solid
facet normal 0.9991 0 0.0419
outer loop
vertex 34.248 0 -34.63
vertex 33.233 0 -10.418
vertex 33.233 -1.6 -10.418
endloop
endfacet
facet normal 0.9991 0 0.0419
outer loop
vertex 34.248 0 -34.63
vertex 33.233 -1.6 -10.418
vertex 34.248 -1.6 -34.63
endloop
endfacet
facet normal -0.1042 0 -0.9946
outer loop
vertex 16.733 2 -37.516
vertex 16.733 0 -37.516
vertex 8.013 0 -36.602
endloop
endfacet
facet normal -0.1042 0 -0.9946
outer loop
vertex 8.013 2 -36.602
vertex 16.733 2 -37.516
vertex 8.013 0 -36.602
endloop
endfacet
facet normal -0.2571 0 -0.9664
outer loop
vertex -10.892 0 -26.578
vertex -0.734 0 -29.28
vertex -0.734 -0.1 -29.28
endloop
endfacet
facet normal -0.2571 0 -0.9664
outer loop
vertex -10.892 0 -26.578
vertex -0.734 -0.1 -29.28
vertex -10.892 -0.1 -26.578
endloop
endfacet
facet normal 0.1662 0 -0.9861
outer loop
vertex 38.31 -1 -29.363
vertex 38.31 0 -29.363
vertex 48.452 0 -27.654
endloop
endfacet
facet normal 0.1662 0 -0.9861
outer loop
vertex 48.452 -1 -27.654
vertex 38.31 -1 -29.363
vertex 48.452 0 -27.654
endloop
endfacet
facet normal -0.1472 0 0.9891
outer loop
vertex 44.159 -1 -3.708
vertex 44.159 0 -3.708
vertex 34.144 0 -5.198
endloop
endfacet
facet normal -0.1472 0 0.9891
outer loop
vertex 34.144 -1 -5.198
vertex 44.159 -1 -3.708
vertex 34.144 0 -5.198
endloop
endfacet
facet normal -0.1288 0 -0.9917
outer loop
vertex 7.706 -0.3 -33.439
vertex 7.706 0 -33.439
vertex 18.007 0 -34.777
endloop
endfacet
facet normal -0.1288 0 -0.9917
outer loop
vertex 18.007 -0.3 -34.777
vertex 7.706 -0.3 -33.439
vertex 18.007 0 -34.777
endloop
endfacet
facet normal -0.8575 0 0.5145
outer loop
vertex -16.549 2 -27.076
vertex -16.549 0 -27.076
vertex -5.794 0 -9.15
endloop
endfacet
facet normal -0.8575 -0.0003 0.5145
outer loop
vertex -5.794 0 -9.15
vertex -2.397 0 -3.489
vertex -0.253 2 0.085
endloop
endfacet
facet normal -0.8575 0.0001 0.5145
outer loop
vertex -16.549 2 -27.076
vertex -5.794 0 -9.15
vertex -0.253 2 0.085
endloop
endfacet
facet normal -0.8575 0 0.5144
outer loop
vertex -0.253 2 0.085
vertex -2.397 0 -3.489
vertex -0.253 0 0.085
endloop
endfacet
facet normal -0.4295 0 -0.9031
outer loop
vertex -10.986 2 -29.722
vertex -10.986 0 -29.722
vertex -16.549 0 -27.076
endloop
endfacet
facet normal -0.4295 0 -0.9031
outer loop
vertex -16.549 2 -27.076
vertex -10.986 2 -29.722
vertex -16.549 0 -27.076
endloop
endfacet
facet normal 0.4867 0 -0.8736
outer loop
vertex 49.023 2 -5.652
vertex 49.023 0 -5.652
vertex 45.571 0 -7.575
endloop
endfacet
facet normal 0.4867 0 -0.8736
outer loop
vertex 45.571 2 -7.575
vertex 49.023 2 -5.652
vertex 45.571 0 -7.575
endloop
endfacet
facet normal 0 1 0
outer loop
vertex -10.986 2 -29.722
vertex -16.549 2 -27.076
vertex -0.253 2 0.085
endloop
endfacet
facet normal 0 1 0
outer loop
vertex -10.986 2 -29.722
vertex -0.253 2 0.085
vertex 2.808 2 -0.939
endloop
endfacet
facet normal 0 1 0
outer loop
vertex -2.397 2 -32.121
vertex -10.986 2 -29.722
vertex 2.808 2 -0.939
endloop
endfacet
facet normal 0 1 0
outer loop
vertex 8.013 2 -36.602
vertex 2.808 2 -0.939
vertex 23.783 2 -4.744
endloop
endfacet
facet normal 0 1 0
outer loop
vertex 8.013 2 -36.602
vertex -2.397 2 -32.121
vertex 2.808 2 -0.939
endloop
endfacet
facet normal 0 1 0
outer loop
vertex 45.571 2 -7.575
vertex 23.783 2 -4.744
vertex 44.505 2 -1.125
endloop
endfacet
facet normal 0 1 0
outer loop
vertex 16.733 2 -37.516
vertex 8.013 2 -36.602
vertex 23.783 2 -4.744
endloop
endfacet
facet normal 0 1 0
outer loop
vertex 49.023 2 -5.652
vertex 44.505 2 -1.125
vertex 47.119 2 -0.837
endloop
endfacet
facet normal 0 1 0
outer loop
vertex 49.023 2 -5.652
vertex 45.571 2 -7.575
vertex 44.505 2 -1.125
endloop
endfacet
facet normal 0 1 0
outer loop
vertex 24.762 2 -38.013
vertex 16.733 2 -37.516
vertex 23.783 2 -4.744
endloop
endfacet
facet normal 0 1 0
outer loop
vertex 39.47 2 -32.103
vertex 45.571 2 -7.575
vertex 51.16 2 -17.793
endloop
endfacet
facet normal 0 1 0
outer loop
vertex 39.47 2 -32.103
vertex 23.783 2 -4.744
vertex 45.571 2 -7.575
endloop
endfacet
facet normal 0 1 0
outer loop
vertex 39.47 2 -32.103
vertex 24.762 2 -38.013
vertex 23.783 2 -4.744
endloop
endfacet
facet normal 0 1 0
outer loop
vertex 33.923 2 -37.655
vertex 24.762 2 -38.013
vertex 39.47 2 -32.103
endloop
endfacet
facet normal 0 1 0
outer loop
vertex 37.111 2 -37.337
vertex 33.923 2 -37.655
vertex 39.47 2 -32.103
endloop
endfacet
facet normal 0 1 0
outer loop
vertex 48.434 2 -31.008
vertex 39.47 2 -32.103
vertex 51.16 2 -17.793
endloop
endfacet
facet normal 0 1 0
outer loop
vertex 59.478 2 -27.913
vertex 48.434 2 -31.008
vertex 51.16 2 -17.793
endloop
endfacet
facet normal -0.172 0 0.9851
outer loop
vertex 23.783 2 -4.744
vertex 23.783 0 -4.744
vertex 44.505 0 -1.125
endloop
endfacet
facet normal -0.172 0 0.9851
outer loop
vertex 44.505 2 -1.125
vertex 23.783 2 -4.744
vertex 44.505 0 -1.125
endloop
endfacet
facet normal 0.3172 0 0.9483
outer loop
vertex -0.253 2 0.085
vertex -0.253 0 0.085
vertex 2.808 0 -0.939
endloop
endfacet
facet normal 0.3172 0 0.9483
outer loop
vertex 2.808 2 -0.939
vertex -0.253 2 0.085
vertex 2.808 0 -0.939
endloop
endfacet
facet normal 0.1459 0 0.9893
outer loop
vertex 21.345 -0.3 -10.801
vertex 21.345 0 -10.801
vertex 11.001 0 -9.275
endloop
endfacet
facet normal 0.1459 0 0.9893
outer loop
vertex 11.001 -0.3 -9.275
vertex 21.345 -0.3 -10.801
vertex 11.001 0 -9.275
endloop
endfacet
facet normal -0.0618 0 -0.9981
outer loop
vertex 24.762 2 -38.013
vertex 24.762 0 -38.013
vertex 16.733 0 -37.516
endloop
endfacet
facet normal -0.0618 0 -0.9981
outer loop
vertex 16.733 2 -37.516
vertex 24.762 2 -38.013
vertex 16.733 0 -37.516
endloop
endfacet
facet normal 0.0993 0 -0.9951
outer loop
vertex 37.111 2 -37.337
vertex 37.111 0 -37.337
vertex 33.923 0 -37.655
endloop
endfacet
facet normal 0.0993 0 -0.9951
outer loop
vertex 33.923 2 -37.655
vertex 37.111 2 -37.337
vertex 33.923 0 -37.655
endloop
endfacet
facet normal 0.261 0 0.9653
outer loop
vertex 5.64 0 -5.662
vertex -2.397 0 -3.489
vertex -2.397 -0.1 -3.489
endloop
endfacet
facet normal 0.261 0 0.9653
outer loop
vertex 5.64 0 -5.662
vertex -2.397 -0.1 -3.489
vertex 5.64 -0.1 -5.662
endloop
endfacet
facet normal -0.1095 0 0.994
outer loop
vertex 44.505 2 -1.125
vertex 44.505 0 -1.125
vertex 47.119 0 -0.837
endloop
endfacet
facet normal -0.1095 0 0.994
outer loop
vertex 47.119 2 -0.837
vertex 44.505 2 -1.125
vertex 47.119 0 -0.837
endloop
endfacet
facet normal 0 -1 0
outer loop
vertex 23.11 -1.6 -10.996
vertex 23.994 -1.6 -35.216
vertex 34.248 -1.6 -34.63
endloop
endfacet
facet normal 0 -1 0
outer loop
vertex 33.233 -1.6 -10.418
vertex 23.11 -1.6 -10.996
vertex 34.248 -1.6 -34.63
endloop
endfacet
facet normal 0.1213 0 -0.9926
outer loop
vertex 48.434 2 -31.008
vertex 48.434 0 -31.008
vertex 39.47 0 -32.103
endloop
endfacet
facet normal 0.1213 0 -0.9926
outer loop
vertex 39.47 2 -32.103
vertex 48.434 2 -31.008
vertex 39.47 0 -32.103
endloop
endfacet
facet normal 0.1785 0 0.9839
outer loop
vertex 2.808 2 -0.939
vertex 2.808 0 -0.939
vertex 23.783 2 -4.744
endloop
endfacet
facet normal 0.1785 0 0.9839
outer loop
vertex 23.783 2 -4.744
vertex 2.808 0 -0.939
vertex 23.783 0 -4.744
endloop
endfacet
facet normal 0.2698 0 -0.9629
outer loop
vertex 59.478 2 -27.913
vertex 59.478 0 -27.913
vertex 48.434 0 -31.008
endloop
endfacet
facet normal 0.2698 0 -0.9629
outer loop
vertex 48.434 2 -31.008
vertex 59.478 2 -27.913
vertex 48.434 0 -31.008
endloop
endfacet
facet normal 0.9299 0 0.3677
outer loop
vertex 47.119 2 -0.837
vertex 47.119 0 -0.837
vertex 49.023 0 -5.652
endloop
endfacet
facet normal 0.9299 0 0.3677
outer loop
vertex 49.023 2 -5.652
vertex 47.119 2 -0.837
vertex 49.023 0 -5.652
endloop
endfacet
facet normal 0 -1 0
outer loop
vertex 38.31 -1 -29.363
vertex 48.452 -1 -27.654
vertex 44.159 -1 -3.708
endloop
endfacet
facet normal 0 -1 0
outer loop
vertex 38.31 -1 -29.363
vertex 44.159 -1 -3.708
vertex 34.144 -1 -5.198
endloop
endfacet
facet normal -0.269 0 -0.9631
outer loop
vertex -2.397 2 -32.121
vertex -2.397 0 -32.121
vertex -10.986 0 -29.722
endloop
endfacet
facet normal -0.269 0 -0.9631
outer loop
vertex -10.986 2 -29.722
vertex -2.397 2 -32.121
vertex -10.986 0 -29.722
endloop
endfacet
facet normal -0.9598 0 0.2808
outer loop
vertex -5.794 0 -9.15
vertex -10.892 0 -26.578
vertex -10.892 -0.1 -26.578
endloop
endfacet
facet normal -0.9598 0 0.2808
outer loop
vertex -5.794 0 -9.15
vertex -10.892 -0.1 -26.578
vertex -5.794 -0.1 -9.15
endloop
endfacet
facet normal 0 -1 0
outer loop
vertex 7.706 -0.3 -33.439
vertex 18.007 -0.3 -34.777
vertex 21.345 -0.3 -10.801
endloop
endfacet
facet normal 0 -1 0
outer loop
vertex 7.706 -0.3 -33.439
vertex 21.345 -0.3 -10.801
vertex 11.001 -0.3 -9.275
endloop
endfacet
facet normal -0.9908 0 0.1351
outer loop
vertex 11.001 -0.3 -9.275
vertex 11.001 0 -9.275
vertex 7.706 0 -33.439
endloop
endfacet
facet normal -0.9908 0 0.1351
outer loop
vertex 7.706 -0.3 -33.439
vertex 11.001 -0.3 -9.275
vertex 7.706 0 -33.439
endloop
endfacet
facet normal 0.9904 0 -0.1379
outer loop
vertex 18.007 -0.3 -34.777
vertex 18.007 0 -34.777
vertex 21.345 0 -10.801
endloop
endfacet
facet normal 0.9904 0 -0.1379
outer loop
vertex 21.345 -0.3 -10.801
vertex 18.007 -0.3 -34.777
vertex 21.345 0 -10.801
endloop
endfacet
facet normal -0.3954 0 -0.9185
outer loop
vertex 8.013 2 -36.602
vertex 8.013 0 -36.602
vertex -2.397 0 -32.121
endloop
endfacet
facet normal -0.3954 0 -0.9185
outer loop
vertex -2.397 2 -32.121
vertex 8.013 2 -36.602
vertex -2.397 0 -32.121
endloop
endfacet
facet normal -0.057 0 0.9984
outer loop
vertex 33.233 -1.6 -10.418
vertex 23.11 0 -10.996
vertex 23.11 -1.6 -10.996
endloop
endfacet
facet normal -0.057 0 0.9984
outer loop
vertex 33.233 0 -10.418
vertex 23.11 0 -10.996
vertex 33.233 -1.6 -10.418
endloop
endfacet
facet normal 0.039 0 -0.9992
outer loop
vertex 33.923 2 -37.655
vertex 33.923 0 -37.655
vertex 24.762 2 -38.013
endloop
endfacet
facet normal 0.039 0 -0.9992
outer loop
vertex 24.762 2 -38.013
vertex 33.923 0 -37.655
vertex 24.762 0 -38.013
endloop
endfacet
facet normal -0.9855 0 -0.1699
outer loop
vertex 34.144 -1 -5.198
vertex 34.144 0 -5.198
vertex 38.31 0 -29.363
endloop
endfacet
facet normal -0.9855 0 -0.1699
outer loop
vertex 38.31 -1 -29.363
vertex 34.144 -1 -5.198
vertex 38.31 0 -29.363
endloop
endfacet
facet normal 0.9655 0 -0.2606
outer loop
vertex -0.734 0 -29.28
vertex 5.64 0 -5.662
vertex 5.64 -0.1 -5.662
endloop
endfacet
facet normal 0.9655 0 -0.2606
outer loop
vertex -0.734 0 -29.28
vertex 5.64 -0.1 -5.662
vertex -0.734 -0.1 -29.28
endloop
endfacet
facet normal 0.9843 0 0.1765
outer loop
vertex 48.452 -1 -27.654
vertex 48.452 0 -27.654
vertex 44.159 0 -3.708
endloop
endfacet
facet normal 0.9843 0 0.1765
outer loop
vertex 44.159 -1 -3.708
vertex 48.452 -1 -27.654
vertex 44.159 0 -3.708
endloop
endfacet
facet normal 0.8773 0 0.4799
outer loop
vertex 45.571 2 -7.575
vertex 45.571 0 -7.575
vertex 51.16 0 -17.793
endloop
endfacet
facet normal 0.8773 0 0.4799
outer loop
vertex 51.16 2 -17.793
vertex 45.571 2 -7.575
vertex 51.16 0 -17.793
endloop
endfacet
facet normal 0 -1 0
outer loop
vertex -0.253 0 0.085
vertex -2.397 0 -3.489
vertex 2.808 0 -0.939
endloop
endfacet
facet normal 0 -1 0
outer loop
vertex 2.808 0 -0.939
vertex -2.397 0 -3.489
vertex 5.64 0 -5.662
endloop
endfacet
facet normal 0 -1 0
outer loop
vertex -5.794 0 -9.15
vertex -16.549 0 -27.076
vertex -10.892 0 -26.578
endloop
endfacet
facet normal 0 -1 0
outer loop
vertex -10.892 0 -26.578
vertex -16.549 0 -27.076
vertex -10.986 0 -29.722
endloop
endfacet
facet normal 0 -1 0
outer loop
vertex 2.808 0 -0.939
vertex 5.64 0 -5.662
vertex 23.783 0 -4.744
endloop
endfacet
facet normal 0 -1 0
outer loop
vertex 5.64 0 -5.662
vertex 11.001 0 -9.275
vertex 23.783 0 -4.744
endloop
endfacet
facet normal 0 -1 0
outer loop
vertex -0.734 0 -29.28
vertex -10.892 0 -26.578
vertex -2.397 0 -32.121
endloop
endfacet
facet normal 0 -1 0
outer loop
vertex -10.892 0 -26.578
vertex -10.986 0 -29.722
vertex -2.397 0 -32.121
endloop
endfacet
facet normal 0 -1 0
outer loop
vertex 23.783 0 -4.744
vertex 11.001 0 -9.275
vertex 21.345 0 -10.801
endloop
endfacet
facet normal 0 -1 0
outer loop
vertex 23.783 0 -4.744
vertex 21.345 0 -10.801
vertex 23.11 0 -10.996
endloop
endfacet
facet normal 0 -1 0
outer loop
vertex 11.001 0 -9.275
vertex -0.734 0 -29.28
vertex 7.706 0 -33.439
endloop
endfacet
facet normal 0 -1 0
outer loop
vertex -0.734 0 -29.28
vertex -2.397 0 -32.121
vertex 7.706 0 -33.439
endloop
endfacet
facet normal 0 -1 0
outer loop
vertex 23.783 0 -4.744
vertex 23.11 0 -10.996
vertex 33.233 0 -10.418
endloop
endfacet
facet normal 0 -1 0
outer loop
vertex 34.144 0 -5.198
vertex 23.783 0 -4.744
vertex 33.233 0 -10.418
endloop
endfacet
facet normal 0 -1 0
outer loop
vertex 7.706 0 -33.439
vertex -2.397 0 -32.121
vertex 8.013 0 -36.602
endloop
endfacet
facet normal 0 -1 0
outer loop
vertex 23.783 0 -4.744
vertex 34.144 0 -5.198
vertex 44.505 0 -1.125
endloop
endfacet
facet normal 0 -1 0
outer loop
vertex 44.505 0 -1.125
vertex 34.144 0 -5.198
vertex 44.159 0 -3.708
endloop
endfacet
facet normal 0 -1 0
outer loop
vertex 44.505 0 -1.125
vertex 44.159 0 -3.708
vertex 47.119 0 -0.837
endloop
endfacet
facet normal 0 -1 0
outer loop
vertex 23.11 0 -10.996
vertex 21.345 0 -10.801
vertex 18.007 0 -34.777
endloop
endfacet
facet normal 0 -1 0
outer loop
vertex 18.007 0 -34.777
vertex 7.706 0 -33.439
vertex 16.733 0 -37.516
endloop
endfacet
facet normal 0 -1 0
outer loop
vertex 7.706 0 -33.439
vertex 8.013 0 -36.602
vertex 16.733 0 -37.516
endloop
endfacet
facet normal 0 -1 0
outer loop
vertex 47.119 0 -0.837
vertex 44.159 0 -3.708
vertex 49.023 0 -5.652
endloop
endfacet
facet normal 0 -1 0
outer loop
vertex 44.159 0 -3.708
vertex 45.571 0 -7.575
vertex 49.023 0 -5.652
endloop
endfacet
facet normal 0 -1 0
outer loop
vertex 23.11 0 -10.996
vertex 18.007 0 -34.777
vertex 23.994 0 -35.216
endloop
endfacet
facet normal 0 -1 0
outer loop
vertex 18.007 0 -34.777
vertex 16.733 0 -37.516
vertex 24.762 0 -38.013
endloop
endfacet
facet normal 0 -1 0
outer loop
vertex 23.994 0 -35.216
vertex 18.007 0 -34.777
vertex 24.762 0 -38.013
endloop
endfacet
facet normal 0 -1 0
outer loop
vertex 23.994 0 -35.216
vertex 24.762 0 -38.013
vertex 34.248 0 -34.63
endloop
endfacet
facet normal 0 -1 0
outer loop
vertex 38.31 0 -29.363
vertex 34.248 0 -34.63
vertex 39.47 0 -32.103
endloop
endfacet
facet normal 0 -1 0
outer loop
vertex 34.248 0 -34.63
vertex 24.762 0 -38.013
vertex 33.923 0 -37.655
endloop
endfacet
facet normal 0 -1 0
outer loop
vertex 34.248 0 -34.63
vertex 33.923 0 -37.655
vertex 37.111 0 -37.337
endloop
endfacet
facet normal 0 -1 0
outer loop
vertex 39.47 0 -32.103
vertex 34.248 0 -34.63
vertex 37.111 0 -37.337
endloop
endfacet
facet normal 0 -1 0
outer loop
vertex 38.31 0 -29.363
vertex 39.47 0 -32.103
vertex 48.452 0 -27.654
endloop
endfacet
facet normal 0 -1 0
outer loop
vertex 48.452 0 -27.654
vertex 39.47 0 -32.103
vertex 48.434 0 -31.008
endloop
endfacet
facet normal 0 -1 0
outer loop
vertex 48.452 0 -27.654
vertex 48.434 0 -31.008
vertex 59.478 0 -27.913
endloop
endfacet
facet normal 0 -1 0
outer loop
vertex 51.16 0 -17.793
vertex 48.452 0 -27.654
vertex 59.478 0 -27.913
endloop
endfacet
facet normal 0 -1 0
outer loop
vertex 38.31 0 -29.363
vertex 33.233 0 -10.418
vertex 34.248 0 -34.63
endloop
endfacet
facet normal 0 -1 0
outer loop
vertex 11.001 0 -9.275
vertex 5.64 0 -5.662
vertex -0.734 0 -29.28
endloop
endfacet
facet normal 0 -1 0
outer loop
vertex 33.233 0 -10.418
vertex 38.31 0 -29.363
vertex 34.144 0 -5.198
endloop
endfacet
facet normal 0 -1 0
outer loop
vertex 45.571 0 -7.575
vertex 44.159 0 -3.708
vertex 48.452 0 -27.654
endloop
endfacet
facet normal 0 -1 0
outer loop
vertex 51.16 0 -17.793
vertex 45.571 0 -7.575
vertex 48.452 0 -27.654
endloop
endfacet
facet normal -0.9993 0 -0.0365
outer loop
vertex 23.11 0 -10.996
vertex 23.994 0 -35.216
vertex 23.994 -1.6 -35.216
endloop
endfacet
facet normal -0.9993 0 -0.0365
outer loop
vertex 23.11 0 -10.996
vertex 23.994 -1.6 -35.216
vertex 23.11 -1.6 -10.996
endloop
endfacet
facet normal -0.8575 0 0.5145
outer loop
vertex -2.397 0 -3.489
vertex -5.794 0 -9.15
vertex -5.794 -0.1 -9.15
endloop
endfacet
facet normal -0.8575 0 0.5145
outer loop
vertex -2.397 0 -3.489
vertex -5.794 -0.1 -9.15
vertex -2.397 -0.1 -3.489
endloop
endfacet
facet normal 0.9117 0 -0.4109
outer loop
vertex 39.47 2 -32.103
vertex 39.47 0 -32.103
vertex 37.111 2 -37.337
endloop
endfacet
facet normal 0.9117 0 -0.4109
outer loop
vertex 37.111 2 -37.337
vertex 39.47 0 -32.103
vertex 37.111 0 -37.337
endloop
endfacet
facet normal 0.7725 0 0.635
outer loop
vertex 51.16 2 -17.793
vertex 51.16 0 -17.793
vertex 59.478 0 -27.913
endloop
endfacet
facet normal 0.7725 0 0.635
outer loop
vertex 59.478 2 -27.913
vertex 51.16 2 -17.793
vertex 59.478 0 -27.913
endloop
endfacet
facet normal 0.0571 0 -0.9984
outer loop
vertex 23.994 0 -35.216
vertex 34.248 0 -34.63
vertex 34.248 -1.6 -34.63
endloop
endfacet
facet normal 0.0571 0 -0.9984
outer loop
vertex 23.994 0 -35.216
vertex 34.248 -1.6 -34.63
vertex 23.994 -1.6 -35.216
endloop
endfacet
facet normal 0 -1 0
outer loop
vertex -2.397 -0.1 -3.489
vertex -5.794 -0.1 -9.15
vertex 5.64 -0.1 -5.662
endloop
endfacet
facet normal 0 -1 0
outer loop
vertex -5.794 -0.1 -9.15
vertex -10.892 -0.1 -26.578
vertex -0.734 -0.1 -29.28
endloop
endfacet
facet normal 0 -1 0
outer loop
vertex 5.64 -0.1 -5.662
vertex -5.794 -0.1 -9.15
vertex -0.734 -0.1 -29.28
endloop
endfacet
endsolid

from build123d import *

# Parameters (mm, degrees)
BOSS_EXTRUDE1_DEPTH = 0.1
BOSS_EXTRUDE2_DEPTH = 0.3
BOSS_EXTRUDE3_DEPTH = 1.6
BOSS_EXTRUDE4_DEPTH = 1
BOSS_EXTRUDE6_DEPTH = 2


with BuildPart() as part:
    # Sketch1 → Boss-Extrude1 (new body)
    with BuildSketch(Plane(origin=(0, 0, 0), x_dir=(1, 0, 0), z_dir=(0, 1, 0))):
        Polygon((-10.891797249, 26.577808825), (-5.79351947, 9.149986826), (-2.397224373, 3.489407839), (5.640466214, 5.66196227), (-0.734212813, 29.279724171), align=None)
    extrude(amount=-BOSS_EXTRUDE1_DEPTH)



with BuildPart() as body_2:
    # Sketch1<4> → Boss-Extrude2 (new body)
    with BuildSketch(Plane(origin=(0, 0, 0), x_dir=(1, 0, 0), z_dir=(0, 1, 0))):
        Polygon((18.007446345, 34.7772024), (7.705525211, 33.438949507), (11.001219022, 9.275344539), (21.345127352, 10.801402821), align=None)
    extrude(amount=-BOSS_EXTRUDE2_DEPTH)


with BuildPart() as body_3:
    # Sketch1<6> → Boss-Extrude3 (new body)
    with BuildSketch(Plane(origin=(0, 0, 0), x_dir=(1, 0, 0), z_dir=(0, 1, 0))):
        Polygon((34.248462201, 34.6301789), (23.994142325, 35.215869617), (23.110432029, 10.99610324), (33.233450435, 10.417934204), align=None)
    extrude(amount=-BOSS_EXTRUDE3_DEPTH)


with BuildPart() as body_4:
    # Sketch1<7> → Boss-Extrude4 (new body)
    with BuildSketch(Plane(origin=(0, 0, 0), x_dir=(1, 0, 0), z_dir=(0, 1, 0))):
        Polygon((48.452043785, 27.653721075), (38.309825185, 29.363057326), (34.143873473, 5.198308151), (44.159317146, 3.708440275), align=None)
    extrude(amount=-BOSS_EXTRUDE4_DEPTH)


with BuildPart() as part_1:
    add(part.part)

    add(body_2.part)  # Boss-Extrude6 merges body 2

    add(body_3.part)  # Boss-Extrude6 merges body 3

    add(body_4.part)  # Boss-Extrude6 merges body 4
    # Sketch1<9> → Boss-Extrude6 (add)
    with BuildSketch(Plane(origin=(0, 0, 0), x_dir=(1, 0, 0), z_dir=(0, 1, 0))):
        Polygon((-10.986197156, 29.721735633), (-16.549013322, 27.076085928), (-0.25286222, -0.084584113), (2.807938166, 0.939274203), (23.783364855, 4.743803832), (44.5054493, 1.124608783), (47.119494483, 0.837420224), (49.023338551, 5.65160383), (45.570660298, 7.575242468), (51.160151479, 17.793063144), (59.478406067, 27.913224514), (48.433689461, 31.007653737), (39.469998377, 32.102859377), (37.111434986, 37.337196557), (33.923134788, 37.655423442), (24.762205898, 38.01292185), (16.732720281, 37.515854171), (8.013100705, 36.602302747), (-2.397224373, 32.120681941), align=None)
    extrude(amount=BOSS_EXTRUDE6_DEPTH)


solid = part_1.part
